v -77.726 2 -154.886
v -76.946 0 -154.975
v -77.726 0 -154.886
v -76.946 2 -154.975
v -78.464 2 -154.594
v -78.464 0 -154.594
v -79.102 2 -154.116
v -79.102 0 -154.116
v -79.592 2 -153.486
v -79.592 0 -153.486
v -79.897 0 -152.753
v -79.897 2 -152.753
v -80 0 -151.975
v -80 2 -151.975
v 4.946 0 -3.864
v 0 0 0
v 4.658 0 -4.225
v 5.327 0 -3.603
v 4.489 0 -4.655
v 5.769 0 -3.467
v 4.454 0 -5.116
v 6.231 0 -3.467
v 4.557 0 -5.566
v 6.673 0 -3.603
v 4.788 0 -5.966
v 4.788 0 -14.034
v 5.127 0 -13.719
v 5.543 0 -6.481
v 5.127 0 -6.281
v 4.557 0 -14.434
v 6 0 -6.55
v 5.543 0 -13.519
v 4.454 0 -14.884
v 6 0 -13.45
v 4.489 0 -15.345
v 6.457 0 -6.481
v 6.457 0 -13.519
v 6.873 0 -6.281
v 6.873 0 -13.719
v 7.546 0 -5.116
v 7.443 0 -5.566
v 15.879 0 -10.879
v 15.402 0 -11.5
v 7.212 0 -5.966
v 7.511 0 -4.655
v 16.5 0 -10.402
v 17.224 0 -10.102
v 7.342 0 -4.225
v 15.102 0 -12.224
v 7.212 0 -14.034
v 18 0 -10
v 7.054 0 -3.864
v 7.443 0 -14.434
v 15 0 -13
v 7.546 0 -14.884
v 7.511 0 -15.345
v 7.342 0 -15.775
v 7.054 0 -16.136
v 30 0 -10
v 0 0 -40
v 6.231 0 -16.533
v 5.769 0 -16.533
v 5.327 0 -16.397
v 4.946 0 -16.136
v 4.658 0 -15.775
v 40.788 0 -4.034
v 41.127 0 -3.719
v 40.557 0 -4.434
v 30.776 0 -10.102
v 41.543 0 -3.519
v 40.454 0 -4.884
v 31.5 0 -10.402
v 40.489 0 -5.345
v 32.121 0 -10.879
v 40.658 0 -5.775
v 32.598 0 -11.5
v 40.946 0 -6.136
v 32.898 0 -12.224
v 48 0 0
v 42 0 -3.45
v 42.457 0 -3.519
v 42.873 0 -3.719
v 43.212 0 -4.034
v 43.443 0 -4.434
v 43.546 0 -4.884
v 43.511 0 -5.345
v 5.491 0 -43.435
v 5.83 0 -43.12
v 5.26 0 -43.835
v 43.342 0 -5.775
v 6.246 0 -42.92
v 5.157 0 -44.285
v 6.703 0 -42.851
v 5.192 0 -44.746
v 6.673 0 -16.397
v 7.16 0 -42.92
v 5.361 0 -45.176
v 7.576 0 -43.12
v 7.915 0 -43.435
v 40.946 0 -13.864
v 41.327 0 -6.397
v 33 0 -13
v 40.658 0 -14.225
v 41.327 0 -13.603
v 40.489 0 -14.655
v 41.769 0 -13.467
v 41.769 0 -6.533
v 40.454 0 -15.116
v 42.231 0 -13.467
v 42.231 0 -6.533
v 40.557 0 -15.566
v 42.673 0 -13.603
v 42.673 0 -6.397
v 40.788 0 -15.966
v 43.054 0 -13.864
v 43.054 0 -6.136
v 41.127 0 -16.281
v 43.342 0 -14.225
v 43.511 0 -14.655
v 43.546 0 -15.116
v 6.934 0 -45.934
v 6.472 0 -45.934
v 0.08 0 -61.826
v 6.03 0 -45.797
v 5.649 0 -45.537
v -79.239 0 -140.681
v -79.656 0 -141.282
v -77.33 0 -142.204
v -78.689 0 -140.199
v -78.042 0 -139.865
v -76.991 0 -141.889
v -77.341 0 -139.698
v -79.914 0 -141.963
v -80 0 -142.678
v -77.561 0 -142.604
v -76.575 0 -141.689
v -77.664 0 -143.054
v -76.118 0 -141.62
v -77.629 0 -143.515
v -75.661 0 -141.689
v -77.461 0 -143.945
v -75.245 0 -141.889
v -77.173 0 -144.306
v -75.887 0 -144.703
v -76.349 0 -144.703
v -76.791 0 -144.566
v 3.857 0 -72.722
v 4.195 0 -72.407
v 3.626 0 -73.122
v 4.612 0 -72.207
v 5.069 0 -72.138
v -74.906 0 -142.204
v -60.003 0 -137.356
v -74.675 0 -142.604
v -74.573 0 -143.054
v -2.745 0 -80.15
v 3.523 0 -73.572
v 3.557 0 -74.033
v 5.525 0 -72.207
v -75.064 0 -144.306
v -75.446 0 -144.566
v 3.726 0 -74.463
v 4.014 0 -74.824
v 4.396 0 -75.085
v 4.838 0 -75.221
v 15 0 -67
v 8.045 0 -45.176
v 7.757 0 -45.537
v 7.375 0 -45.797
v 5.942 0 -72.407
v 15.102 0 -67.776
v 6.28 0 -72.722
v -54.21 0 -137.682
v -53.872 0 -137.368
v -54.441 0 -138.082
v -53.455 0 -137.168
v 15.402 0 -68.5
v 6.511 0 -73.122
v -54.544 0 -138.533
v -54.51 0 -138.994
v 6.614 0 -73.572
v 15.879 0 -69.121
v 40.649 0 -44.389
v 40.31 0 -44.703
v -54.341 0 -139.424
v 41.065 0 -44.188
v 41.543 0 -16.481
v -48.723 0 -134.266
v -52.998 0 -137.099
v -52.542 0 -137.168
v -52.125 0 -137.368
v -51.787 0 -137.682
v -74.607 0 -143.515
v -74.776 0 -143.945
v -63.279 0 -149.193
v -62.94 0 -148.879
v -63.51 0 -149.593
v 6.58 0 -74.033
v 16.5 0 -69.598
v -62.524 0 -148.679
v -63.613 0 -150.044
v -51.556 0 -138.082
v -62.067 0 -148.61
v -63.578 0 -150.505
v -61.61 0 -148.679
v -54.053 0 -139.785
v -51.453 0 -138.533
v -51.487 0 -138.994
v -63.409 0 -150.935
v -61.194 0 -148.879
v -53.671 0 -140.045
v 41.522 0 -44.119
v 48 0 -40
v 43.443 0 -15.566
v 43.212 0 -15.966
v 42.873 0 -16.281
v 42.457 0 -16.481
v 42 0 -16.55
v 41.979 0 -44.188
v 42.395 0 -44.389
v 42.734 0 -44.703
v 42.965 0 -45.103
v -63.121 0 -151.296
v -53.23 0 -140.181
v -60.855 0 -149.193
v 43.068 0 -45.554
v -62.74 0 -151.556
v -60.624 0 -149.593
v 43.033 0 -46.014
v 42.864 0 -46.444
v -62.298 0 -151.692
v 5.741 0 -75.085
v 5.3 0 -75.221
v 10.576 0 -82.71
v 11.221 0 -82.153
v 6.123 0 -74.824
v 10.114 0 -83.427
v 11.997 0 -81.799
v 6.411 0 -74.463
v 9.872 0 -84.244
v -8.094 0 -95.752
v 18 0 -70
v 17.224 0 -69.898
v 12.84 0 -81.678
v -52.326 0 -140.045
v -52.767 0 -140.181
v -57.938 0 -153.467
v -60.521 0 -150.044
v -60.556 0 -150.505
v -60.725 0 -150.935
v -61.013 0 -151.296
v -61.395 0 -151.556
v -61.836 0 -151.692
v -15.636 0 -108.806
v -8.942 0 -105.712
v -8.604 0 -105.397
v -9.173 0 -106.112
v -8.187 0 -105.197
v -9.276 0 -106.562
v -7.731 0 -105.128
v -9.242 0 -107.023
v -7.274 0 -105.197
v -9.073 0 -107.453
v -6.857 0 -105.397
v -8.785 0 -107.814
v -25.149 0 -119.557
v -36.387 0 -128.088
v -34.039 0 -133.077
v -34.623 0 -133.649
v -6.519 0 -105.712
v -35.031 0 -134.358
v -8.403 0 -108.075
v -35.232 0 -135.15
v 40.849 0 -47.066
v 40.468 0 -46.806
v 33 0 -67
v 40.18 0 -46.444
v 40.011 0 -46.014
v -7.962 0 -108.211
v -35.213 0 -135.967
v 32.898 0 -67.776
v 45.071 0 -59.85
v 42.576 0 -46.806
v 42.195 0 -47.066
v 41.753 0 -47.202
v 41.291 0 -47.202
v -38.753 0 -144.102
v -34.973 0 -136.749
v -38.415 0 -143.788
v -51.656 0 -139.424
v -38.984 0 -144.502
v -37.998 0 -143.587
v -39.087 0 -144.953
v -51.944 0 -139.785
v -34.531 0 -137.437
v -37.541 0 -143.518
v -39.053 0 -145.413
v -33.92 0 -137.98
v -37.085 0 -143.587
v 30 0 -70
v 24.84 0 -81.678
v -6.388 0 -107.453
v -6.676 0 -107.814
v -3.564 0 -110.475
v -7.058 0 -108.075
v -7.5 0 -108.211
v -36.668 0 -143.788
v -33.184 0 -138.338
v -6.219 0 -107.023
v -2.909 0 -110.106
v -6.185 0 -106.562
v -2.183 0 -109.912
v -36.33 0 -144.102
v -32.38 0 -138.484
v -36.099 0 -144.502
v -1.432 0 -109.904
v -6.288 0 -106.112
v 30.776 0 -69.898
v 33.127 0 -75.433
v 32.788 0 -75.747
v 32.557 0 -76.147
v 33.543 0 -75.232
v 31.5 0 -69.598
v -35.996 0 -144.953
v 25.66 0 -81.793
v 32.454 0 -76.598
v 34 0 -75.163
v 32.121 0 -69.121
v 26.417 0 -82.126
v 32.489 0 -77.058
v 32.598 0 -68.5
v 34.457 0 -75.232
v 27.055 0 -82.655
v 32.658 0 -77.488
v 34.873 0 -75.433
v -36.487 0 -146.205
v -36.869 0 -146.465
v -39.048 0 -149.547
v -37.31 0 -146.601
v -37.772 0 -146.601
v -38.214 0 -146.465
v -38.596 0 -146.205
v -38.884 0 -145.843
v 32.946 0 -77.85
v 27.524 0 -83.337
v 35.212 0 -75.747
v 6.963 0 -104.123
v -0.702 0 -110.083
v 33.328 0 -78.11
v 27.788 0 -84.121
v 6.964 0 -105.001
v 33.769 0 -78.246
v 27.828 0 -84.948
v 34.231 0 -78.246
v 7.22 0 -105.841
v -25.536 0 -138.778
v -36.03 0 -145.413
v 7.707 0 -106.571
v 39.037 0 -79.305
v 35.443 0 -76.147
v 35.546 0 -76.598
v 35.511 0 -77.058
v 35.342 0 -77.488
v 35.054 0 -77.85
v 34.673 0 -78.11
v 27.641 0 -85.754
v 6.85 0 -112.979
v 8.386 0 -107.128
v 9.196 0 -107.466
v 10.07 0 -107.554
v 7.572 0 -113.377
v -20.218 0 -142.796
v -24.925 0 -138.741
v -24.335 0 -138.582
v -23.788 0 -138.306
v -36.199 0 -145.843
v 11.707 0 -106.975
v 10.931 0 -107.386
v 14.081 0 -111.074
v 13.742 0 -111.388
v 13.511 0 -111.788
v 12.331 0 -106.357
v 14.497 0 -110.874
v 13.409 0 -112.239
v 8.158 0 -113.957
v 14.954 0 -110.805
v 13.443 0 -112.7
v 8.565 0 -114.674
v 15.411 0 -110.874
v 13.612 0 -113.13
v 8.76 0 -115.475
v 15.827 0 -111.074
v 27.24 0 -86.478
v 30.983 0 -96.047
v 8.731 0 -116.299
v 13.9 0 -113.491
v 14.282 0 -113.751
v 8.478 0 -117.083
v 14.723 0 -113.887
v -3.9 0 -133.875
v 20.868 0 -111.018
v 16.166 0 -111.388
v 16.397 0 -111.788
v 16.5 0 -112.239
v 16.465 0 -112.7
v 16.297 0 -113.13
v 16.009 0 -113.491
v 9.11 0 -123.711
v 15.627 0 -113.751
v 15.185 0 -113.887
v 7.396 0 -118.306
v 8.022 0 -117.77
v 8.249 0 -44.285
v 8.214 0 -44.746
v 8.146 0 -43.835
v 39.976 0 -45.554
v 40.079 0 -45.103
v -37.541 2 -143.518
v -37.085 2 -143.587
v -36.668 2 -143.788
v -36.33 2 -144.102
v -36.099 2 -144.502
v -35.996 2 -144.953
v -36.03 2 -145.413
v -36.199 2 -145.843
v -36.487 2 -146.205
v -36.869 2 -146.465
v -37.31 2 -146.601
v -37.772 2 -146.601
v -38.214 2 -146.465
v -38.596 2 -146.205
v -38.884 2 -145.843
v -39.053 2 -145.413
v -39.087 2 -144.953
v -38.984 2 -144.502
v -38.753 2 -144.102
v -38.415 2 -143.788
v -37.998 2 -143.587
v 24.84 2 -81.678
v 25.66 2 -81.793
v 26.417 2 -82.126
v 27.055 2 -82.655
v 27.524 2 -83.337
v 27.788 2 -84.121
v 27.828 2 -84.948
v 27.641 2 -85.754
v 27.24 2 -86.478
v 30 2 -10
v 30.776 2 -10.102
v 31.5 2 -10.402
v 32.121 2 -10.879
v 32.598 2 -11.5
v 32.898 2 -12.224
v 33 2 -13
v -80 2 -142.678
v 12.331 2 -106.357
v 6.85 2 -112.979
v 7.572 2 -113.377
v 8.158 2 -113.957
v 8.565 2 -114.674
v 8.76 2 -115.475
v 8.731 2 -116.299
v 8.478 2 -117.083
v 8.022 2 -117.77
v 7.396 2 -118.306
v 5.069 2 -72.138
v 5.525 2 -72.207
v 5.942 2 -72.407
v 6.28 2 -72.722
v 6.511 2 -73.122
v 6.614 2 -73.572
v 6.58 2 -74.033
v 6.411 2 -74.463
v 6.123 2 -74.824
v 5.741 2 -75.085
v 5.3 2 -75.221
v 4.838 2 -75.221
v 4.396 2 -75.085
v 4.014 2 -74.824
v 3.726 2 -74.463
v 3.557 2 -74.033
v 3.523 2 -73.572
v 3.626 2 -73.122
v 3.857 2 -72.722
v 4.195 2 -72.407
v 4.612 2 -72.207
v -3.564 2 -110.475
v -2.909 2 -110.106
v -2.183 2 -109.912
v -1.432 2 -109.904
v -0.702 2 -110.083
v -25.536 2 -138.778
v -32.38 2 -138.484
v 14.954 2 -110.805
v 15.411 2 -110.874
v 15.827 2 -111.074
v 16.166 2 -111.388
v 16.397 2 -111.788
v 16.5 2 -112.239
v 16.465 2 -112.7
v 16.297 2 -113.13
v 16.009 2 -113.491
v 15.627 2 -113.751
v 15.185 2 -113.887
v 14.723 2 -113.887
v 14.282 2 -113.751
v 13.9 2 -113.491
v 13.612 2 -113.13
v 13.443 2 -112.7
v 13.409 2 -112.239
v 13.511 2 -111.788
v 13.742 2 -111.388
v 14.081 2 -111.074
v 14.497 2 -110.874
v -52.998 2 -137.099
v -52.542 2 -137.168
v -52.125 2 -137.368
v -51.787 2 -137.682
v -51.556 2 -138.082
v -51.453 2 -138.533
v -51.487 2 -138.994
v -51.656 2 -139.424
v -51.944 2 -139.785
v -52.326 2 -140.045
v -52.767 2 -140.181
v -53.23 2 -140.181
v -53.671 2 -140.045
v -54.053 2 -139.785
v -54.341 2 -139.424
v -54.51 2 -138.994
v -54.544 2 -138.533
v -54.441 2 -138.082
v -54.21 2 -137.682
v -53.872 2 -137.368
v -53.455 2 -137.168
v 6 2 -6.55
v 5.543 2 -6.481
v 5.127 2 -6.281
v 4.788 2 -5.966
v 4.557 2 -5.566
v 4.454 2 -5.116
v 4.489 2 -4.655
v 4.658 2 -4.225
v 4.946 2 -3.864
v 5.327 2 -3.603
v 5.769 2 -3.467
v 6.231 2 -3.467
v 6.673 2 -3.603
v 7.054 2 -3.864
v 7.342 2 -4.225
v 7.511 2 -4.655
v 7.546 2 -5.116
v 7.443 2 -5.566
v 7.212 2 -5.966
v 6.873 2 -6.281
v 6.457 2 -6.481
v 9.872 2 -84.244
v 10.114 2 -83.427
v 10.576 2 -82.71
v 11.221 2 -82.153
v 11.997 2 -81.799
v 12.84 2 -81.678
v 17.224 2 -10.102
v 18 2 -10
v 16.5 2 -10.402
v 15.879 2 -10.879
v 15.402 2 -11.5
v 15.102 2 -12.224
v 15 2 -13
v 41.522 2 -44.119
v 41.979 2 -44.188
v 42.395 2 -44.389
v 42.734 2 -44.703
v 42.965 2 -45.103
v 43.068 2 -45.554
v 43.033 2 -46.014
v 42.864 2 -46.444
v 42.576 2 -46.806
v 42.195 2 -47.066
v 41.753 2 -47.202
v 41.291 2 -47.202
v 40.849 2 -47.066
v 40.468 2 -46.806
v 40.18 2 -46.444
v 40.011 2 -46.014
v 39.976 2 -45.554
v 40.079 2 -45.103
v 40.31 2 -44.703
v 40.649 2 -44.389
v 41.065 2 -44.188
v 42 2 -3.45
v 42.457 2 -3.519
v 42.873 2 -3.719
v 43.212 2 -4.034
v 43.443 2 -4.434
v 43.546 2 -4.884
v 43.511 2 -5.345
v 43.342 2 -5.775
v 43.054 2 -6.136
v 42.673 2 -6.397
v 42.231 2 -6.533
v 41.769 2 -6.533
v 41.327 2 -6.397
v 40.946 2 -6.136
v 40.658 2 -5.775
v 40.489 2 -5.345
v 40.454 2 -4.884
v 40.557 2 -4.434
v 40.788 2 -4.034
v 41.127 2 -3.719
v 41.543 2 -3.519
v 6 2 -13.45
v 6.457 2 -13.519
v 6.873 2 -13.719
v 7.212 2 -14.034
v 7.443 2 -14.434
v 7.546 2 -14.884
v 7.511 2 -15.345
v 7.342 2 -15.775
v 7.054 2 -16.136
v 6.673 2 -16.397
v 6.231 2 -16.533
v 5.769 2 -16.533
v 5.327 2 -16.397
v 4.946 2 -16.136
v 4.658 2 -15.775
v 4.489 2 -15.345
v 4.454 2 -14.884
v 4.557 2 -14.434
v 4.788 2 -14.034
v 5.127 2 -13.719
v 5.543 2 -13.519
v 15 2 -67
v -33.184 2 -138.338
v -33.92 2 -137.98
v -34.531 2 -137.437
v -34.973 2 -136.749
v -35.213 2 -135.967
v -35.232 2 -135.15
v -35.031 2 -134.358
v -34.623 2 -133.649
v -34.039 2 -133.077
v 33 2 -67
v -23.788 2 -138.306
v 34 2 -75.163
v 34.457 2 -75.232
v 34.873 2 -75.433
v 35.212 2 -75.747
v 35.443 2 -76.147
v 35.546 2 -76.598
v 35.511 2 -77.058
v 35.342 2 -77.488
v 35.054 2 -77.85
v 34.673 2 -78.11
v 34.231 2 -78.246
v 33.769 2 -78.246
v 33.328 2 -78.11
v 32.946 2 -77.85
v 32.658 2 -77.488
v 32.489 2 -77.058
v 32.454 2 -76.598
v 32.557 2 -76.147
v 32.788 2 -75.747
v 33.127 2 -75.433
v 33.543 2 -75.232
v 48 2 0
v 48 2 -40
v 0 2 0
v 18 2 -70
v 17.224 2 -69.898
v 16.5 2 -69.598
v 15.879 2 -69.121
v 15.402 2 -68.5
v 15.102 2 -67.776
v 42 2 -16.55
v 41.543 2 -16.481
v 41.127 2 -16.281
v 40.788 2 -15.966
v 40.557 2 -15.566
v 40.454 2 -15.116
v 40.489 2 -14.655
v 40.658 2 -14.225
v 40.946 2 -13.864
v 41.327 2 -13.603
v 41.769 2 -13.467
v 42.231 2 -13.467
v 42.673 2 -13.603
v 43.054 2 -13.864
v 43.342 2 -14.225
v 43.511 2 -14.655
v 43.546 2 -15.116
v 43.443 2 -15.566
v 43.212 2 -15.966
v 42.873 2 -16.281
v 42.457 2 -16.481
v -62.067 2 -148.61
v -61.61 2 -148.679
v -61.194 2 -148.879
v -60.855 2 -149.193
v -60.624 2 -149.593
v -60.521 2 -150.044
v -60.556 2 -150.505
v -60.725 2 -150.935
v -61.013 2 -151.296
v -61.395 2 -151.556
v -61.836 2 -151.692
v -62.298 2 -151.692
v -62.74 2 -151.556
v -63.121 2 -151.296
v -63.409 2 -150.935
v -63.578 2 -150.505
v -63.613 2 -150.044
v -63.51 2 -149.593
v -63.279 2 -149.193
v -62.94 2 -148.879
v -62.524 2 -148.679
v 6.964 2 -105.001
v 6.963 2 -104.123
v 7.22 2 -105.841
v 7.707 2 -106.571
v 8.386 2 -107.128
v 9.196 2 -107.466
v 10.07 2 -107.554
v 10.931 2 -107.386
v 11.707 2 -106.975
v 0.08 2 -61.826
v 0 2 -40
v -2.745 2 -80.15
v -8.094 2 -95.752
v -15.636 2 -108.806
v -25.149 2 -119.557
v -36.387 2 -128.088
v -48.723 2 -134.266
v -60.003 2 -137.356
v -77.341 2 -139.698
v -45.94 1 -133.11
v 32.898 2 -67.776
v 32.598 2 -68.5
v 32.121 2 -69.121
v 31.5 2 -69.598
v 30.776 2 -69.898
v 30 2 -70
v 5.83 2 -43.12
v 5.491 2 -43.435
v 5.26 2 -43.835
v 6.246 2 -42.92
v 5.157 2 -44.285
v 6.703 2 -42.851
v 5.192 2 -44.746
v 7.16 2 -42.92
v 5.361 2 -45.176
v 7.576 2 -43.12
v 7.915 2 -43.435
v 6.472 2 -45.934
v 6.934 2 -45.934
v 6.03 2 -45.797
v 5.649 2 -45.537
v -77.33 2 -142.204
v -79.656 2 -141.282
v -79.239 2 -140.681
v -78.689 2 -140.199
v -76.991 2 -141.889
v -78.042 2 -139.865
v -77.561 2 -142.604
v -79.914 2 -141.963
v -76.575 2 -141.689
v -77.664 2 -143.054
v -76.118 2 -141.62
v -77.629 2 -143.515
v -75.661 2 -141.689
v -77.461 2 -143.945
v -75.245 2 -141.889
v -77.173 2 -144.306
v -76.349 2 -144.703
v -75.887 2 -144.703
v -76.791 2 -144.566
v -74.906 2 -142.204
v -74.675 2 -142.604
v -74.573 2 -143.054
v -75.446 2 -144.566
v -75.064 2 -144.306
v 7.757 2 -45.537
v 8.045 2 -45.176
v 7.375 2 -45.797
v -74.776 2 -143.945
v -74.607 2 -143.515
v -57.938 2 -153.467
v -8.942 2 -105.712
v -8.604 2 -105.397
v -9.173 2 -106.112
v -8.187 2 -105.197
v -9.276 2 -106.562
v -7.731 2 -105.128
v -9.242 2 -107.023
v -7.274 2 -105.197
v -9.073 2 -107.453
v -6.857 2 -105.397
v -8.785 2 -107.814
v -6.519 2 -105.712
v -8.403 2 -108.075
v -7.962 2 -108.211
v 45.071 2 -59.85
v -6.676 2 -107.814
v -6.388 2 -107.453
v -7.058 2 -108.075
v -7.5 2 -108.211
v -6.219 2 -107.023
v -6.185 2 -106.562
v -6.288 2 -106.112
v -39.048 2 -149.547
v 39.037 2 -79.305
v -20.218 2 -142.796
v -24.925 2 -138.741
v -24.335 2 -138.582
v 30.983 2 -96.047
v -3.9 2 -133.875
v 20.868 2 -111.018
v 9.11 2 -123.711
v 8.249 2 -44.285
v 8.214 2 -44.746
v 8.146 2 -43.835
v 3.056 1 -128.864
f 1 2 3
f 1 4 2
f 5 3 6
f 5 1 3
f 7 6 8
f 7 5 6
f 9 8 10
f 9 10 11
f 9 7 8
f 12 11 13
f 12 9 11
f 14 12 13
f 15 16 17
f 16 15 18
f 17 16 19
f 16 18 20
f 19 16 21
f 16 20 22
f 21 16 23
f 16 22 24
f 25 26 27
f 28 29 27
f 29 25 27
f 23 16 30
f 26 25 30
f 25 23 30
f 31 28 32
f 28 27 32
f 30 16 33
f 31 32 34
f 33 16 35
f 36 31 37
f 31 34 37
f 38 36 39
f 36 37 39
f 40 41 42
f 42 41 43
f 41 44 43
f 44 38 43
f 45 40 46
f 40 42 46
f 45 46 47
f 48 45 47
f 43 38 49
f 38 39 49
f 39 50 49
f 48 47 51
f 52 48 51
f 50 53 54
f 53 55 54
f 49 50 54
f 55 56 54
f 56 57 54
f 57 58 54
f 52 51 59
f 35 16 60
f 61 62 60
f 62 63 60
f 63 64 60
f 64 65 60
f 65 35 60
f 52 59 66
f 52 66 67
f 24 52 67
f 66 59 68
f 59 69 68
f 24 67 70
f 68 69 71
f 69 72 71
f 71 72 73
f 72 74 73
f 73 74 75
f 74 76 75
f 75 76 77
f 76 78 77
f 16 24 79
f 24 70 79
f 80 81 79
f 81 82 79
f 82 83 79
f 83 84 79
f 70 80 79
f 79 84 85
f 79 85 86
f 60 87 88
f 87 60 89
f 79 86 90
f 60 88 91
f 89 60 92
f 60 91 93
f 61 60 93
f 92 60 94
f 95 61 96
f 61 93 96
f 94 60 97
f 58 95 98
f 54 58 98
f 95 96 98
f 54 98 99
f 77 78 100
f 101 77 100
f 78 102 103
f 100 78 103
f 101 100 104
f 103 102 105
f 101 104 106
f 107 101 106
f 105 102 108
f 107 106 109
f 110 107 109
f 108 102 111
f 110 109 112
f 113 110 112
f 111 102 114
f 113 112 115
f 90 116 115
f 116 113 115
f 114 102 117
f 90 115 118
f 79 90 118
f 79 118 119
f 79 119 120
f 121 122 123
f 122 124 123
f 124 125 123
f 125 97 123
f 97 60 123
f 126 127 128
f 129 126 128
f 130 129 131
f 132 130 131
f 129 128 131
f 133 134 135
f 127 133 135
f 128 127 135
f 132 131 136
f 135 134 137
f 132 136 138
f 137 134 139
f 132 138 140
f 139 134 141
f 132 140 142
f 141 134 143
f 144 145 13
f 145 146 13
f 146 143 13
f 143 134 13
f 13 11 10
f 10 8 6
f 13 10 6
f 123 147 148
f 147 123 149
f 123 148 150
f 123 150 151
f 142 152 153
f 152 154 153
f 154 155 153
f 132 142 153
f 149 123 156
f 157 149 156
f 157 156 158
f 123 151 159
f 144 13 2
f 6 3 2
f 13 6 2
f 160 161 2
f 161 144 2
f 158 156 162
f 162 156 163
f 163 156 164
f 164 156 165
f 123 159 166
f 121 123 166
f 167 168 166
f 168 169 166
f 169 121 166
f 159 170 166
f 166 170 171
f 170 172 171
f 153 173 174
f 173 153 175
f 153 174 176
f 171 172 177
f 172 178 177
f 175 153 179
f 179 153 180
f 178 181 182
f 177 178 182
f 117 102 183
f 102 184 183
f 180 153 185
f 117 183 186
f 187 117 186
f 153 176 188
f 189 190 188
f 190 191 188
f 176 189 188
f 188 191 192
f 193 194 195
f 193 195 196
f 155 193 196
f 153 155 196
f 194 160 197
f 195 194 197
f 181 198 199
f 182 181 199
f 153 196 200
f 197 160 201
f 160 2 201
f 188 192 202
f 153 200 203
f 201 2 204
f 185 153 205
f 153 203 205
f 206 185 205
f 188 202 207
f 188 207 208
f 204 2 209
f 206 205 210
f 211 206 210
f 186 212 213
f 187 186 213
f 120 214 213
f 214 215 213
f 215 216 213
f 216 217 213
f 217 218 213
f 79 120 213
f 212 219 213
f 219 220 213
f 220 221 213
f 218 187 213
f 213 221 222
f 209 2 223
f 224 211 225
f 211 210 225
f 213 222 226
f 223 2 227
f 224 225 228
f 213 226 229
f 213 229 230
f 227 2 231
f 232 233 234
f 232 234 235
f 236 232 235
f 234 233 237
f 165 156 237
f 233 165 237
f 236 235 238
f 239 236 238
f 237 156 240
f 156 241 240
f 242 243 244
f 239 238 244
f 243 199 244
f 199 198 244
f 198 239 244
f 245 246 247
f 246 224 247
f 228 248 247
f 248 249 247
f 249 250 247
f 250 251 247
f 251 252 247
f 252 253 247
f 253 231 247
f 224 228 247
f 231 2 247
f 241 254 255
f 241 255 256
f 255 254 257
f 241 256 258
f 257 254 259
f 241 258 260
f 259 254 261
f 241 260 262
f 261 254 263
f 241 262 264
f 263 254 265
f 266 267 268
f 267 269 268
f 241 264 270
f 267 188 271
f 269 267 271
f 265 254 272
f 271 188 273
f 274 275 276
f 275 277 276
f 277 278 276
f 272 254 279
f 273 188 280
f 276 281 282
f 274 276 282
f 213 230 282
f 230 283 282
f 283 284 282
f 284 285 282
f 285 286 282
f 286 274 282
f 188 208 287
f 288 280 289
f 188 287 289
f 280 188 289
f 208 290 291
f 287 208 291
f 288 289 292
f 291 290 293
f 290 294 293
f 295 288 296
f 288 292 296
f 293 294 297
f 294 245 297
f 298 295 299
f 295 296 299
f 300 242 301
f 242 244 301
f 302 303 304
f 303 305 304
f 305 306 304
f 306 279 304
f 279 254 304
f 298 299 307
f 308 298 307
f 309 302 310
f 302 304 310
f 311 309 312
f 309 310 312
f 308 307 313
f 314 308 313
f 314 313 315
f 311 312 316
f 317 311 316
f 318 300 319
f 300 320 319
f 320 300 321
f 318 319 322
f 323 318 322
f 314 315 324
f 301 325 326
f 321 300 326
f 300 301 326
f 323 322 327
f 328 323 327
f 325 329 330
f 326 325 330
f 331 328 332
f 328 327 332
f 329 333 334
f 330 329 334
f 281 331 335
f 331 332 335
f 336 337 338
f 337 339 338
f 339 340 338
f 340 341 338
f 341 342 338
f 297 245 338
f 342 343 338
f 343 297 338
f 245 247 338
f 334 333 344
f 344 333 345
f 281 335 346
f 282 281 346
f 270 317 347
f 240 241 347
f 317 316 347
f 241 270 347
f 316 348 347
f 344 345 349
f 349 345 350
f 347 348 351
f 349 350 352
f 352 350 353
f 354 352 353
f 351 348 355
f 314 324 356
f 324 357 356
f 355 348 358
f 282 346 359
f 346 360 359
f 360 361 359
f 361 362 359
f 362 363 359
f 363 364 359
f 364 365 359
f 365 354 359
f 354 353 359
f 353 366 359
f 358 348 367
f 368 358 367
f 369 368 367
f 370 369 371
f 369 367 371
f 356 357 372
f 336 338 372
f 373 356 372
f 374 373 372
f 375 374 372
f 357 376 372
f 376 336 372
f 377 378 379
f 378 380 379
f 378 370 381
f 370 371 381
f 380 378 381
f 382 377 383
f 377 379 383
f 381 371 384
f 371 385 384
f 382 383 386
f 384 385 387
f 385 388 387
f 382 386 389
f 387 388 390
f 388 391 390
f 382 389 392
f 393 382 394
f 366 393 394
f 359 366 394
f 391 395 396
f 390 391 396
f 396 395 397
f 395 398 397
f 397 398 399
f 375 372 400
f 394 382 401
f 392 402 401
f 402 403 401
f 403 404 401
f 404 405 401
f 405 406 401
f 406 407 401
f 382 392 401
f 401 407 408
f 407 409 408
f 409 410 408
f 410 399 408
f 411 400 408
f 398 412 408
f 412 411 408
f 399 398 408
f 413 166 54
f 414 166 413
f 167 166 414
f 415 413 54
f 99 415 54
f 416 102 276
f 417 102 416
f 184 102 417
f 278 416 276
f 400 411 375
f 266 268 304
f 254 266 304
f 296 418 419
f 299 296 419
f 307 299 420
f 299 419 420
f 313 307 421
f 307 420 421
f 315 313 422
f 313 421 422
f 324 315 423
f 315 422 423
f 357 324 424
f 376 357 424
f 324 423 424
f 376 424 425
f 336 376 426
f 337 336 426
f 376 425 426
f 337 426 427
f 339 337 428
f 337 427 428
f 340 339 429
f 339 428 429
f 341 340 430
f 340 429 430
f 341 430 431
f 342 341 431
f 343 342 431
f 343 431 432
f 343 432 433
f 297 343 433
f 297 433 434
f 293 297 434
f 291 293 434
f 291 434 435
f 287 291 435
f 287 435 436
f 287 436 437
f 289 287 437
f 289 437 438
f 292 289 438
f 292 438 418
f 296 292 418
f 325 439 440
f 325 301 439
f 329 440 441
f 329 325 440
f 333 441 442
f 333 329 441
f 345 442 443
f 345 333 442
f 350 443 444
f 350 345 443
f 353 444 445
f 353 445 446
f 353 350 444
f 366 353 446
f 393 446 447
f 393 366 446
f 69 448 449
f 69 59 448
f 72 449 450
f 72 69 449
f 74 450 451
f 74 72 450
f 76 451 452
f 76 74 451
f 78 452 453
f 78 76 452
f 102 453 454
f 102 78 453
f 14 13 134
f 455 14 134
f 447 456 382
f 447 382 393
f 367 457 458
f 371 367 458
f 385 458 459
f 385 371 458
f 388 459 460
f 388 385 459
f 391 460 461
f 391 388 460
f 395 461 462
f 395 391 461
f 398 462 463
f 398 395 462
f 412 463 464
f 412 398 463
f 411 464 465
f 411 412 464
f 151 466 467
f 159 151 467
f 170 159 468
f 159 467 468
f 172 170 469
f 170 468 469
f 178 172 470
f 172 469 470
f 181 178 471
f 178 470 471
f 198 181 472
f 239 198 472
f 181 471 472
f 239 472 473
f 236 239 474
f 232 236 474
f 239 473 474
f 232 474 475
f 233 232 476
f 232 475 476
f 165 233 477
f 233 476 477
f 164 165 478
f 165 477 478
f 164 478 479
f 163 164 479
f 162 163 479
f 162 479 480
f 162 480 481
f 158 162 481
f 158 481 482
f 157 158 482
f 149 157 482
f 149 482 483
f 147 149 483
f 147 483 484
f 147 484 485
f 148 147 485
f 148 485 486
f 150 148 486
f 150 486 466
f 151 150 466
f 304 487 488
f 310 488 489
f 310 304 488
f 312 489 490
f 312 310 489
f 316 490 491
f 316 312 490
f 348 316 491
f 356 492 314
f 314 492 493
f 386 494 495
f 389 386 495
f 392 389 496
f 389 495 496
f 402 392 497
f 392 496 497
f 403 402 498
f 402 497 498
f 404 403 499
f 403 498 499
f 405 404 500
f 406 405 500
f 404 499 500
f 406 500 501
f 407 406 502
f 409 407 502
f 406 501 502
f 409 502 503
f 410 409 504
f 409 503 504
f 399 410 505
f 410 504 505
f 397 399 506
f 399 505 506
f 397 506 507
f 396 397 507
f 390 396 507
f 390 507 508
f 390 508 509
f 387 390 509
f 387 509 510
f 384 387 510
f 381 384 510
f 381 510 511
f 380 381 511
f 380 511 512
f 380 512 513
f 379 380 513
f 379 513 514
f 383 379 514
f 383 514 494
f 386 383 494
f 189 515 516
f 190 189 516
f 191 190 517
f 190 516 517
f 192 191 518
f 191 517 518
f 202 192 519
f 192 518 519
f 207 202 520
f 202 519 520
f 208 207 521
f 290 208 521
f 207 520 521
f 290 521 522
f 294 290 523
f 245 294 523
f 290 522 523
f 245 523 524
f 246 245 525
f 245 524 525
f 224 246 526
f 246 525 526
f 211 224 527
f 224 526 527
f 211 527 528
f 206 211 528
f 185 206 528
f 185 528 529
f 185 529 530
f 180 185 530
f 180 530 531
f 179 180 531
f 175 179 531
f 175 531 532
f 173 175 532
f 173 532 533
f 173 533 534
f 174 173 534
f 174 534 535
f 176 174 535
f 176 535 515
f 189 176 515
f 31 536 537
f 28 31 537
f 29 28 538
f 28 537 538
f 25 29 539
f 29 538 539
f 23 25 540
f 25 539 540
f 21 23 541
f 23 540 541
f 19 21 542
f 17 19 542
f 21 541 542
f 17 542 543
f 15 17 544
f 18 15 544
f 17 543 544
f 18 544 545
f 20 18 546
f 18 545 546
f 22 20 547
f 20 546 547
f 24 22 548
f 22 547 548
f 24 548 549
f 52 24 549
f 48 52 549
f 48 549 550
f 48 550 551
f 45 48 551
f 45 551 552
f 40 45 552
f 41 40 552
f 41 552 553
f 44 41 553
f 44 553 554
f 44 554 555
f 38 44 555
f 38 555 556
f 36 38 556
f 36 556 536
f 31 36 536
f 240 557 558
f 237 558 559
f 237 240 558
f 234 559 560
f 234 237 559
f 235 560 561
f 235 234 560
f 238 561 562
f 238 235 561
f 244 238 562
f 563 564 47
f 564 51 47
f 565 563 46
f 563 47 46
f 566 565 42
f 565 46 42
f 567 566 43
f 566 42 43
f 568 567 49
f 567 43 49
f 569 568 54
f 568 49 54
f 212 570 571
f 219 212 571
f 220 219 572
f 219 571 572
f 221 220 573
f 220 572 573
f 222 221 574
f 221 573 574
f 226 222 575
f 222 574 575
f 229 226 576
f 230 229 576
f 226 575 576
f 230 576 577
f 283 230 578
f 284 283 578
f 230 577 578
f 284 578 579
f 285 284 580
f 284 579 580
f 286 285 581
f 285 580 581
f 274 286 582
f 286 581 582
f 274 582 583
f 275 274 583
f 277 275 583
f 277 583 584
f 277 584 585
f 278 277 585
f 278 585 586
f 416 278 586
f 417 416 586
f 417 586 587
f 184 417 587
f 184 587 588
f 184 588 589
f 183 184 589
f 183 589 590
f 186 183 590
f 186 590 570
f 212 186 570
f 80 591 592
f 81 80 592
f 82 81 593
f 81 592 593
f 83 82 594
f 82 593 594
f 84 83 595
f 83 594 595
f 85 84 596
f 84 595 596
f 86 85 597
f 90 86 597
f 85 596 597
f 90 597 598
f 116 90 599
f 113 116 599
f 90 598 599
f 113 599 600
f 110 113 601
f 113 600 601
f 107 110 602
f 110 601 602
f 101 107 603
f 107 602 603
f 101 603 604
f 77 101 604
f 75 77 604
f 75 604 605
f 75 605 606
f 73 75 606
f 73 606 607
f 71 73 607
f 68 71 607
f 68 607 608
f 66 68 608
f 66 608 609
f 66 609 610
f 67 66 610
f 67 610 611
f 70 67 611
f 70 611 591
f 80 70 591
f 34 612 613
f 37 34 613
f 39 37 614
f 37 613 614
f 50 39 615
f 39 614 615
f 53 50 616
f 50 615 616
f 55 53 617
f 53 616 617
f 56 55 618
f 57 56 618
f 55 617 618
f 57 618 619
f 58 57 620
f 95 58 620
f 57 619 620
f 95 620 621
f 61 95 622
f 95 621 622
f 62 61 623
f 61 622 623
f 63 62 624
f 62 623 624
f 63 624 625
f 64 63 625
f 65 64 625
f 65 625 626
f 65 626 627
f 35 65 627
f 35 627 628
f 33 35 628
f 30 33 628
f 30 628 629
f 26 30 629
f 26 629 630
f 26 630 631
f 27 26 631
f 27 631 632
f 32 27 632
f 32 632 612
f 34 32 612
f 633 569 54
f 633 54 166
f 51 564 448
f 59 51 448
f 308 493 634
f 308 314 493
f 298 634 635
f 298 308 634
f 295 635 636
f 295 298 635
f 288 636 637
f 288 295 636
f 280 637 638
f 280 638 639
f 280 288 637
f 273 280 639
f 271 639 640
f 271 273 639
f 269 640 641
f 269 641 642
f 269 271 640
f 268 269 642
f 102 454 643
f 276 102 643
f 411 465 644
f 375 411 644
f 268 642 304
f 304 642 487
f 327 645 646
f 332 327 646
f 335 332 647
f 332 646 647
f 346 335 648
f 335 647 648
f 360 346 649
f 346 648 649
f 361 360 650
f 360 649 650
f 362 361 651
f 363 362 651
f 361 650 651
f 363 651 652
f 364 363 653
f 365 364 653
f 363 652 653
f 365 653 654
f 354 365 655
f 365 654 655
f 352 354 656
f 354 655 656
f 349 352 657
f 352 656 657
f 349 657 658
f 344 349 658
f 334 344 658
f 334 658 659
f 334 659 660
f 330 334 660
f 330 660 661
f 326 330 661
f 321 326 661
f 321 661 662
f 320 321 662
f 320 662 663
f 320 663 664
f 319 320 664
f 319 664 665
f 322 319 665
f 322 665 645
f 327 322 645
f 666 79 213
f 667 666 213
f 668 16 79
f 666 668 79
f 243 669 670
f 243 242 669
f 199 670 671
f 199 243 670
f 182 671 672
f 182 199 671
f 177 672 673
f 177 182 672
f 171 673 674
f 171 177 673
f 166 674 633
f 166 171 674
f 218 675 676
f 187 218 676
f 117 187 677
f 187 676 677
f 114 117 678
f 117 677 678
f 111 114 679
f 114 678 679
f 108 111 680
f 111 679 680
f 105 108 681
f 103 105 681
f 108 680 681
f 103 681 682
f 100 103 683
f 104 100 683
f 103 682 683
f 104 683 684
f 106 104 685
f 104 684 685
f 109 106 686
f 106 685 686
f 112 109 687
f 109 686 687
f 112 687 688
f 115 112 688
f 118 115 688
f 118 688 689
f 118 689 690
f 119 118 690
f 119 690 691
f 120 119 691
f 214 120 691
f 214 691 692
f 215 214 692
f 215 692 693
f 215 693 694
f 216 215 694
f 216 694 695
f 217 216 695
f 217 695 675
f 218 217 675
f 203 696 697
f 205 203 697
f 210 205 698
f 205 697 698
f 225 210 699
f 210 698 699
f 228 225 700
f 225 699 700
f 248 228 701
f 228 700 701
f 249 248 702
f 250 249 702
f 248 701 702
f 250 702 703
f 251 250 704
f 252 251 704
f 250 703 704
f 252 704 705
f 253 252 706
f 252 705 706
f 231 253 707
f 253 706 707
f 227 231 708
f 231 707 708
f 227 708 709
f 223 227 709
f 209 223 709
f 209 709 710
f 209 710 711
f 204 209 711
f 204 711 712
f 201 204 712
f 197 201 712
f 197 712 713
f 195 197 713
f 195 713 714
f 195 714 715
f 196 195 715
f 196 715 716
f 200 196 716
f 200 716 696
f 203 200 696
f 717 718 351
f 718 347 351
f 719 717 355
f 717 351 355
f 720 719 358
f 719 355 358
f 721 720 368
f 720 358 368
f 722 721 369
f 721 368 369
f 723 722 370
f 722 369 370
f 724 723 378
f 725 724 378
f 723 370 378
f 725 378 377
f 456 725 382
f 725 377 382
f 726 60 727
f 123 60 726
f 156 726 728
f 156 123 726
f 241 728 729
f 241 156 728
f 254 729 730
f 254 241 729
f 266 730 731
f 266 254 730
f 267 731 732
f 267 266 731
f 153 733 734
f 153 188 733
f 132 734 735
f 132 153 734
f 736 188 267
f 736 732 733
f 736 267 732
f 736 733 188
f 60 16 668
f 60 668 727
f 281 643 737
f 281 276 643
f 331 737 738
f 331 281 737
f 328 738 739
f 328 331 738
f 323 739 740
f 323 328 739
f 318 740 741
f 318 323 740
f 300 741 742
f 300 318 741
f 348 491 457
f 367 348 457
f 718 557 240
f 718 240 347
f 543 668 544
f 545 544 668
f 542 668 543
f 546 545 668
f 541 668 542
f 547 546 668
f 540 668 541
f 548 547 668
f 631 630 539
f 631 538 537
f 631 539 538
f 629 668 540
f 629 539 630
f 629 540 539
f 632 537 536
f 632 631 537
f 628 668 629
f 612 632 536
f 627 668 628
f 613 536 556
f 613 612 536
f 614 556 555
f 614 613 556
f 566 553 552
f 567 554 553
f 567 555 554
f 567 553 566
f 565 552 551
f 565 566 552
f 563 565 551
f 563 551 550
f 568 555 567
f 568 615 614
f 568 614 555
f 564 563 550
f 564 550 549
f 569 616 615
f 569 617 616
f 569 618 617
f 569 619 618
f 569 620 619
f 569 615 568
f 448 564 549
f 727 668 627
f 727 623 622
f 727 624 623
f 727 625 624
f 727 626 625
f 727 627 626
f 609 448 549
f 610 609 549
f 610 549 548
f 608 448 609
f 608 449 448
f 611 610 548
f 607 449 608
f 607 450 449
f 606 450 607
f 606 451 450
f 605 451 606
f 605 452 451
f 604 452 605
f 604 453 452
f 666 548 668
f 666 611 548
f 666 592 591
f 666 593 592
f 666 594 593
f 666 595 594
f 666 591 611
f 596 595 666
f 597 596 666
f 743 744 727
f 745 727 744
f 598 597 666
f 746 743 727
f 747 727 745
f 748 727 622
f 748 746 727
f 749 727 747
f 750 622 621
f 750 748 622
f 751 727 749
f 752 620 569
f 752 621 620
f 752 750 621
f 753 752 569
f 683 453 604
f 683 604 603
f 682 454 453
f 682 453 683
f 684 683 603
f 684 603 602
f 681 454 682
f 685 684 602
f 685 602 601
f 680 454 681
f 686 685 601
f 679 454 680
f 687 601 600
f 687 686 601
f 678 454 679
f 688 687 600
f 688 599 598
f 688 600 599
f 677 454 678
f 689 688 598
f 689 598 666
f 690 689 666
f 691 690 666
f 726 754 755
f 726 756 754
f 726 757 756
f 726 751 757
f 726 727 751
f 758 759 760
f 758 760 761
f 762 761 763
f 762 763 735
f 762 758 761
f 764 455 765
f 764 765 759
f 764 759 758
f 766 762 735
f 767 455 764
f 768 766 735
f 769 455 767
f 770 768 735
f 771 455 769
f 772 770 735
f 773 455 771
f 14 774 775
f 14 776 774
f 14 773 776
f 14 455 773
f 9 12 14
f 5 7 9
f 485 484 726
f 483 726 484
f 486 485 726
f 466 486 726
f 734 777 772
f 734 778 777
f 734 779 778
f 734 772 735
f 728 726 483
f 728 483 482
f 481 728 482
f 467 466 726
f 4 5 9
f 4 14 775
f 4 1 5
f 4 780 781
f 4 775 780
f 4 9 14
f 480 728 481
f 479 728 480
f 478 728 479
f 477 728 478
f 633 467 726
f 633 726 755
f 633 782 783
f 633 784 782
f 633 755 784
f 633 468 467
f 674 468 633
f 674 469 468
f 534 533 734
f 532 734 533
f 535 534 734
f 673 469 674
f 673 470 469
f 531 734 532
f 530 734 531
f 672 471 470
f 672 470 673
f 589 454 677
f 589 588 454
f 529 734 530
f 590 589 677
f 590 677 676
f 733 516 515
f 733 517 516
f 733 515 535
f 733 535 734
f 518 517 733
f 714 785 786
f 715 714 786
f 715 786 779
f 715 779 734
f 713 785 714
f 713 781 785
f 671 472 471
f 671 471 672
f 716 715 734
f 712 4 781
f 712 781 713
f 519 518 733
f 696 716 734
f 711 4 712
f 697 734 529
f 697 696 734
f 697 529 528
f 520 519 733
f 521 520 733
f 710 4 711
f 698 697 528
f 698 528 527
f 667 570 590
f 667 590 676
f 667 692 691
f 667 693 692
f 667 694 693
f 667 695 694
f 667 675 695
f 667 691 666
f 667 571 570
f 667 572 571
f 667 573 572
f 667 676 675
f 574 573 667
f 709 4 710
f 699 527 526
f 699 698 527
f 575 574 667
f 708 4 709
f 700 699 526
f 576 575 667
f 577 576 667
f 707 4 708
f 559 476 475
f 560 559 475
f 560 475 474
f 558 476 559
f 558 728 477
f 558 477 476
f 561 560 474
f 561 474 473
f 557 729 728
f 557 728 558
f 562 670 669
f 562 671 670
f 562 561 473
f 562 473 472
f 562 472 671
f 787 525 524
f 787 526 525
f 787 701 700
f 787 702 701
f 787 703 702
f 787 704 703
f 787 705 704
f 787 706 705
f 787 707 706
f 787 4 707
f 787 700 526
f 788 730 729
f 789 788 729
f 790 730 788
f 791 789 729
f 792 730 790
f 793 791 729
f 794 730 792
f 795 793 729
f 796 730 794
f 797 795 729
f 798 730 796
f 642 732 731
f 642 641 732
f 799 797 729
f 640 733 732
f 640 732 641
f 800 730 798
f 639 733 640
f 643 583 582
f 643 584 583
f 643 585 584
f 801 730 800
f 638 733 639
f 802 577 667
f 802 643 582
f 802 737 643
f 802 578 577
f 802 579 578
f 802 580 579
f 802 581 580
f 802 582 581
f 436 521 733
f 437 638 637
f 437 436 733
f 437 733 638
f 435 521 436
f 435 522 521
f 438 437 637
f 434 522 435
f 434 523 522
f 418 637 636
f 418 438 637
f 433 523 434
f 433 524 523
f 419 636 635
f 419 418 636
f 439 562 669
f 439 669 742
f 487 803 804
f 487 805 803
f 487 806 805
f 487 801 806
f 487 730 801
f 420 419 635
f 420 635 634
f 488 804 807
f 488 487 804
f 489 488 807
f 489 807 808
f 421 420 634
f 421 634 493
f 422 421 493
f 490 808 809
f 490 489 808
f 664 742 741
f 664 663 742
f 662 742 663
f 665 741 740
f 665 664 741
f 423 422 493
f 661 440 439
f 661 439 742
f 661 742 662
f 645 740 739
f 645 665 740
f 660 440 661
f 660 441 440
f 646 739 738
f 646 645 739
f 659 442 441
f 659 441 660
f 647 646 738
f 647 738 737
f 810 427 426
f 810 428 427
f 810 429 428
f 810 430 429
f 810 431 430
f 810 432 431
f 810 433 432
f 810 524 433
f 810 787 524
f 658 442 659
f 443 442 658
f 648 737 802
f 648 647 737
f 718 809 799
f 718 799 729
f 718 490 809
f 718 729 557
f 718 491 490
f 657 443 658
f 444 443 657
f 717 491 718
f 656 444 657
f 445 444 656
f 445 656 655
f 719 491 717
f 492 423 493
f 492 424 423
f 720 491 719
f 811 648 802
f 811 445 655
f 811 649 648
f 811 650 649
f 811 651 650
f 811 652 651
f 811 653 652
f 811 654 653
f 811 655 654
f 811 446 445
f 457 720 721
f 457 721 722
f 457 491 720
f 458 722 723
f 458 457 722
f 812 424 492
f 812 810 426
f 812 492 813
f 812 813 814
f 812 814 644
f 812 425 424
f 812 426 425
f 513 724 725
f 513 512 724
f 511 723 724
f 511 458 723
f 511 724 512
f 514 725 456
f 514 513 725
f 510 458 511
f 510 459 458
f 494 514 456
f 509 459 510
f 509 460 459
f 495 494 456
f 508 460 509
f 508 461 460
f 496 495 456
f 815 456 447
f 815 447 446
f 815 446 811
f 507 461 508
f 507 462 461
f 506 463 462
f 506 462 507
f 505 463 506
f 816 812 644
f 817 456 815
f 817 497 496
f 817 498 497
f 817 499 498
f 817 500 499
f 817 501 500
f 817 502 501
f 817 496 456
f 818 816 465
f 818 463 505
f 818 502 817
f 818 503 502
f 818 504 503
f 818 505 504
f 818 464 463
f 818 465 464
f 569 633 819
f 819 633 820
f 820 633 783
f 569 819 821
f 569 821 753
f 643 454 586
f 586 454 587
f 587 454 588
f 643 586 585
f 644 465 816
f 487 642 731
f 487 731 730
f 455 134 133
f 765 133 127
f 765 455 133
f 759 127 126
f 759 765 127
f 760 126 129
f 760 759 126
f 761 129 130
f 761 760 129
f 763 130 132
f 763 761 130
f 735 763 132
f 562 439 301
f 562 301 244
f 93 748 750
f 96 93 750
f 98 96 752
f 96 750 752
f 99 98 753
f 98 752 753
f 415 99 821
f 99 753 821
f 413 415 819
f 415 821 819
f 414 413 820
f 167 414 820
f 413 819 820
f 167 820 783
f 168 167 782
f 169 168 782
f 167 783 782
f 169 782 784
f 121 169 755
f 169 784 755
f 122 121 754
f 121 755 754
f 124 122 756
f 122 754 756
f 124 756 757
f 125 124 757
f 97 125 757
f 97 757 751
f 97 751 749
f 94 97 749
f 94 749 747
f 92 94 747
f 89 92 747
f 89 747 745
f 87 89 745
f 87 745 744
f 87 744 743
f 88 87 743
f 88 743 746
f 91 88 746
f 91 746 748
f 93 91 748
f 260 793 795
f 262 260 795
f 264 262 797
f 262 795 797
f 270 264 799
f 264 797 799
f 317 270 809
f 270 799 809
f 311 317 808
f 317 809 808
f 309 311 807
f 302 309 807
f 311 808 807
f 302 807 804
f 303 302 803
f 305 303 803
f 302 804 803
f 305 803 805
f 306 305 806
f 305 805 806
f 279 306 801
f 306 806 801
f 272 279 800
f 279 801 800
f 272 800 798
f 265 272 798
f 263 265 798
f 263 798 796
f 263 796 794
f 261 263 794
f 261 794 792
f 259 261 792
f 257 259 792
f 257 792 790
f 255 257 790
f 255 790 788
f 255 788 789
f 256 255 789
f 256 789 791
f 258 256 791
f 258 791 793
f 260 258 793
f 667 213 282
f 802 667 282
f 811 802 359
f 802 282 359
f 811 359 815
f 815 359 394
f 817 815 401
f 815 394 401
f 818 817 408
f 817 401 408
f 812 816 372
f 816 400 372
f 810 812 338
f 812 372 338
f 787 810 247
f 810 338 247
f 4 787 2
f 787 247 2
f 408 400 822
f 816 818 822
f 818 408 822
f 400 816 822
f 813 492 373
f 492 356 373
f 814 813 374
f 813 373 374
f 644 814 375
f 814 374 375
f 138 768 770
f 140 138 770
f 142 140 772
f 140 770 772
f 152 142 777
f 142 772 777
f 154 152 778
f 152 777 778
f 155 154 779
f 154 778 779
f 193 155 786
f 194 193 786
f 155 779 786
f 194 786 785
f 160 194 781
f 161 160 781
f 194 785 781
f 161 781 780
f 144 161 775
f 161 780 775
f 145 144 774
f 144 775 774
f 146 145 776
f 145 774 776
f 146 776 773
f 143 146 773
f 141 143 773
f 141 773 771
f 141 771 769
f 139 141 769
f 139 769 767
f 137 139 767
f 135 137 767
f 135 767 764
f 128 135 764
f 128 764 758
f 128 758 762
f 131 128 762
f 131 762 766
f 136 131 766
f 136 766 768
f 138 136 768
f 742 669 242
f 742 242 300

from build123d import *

# Parameters (mm, degrees)
SKETCH_1_W          = 48
SKETCH_1_H          = 40
EXTRUDE_1_DEPTH     = 2
SKETCH_2_R          = 1.55
CUT_EXTRUDE_1_DEPTH = 175.439280555
SKETCH_3_W          = 18
SKETCH_3_H          = 60
CUT_EXTRUDE_2_DEPTH = 175.439280555
FILLET_1_R          = 3
CUT_EXTRUDE_3_DEPTH = 175.439280555
FILLET_2_R          = 3
CUT_EXTRUDE_4_DEPTH = 175.439280555
FILLET_3_R          = 3
SKETCH_6_R          = 1.55
CUT_EXTRUDE_5_DEPTH = 175.439280555
FILLET_4_R          = 3


with BuildPart() as part:
    # 草图1 → 凸台-拉伸1 (new body)
    with BuildSketch(Plane(origin=(0, 0, 0), x_dir=(1, 0, 0), z_dir=(0, 1, 0))):
        with BuildLine():
            Line((0, 40), (48, 40))
            add(Edge.make_bspline(
                [(48, 40), (45.764951139, 73.28949707), (16.036127279, 137.632117299), (-51.062317124, 155.04671395), (-80, 155)],
                knots=[0, 0, 0, 0, 0.537039459, 1, 1, 1, 1], degree=3))
            Line((-80, 155), (-80, 140))
            add(Edge.make_bspline(
                [(0, 40), (4.51482928, 101.708069088), (-40.684527931, 134.921736198), (-60.886519043, 137.838657836), (-80, 140)],
                knots=[0, 0, 0, 0, 0.623950537, 0.904720498, 0.904720498, 0.904720498, 0.904720498], degree=3))
        make_face()
        with Locations((24, 20)):
            Rectangle(SKETCH_1_W, SKETCH_1_H)
    extrude(amount=EXTRUDE_1_DEPTH)

    # 草图2 → 切除-拉伸1 (cut, through all)
    with BuildSketch(Plane(origin=(0, 2, 0), x_dir=(1, 0, 0), z_dir=(0, 1, 0))):
        with Locations(Location((6, 15, 0), (0, 0, 270))):
            Circle(SKETCH_2_R)
        with Locations(Location((42, 15, 0), (0, 0, 90))):
            Circle(SKETCH_2_R)
        with Locations(Location((42, 5, 0), (0, 0, 270))):
            Circle(SKETCH_2_R)
        with Locations(Location((6, 5, 0), (0, 0, 90))):
            Circle(SKETCH_2_R)
    extrude(amount=-CUT_EXTRUDE_1_DEPTH, mode=Mode.SUBTRACT)

    # 草图3 → 切除-拉伸2 (cut, through all)
    with BuildSketch(Plane(origin=(0, 2, 0), x_dir=(1, 0, 0), z_dir=(0, 1, 0))):
        with Locations((24, 40)):
            Rectangle(SKETCH_3_W, SKETCH_3_H)
    extrude(amount=-CUT_EXTRUDE_2_DEPTH, mode=Mode.SUBTRACT)

    # 圆角1
    fillet_1_edges = [part.edges().sort_by_distance(p)[0] for p in [
        (33, 1, -70),
        (33, 1, -10),
        (15, 1, -10),
        (15, 1, -70),
    ]]
    fillet(fillet_1_edges, radius=FILLET_1_R)

    # 草图4 → 切除-拉伸3 (cut, through all)
    with BuildSketch(Plane(origin=(0, 2, 0), x_dir=(1, 0, 0), z_dir=(0, 1, 0))):
        Polygon((5.255148973, 115.791883332), (30.840281778, 81.678372925), (10.247370008, 81.678372925), align=None)
    extrude(amount=-CUT_EXTRUDE_3_DEPTH, mode=Mode.SUBTRACT)

    # 圆角2
    fillet_2_edges = [part.edges().sort_by_distance(p)[0] for p in [
        (10.247370008, 1, -81.678372925),
        (5.255148973, 1, -115.791883332),
        (30.840281778, 1, -81.678372925),
    ]]
    fillet(fillet_2_edges, radius=FILLET_2_R)

    # 草图5 → 切除-拉伸4 (cut, through all)
    with BuildSketch(Plane(origin=(0, 2, 0), x_dir=(1, 0, 0), z_dir=(0, 1, 0))):
        Polygon((-24.587676852, 138.818288759), (-40.839221994, 138.120949417), (-2.240425067, 109.493508363), (12.388978152, 115.103279522), align=None)
    extrude(amount=-CUT_EXTRUDE_4_DEPTH, mode=Mode.SUBTRACT)

    # 圆角3
    fillet_3_edges = [part.edges().sort_by_distance(p)[0] for p in [
        (-24.587676852, 1, -138.818288759),
        (12.388978152, 1, -115.103279522),
        (-2.240425067, 1, -109.493508363),
        (-40.839221994, 1, -138.120949417),
    ]]
    fillet(fillet_3_edges, radius=FILLET_3_R)

    # 草图6 → 切除-拉伸5 (cut, through all)
    with BuildSketch(Plane(origin=(0, 2, 0), x_dir=(1, 0, 0), z_dir=(0, 1, 0))):
        with Locations(Location((-76.118296747, 143.169932104, 0), (0, 0, 270))):
            Circle(SKETCH_6_R)
        with Locations(Location((-52.99849703, 138.648726826, 0), (0, 0, 270))):
            Circle(SKETCH_6_R)
        with Locations(Location((-7.730564413, 106.678081972, 0), (0, 0, 270))):
            Circle(SKETCH_6_R)
        with Locations(Location((5.068521195, 73.688071708, 0), (0, 0, 270))):
            Circle(SKETCH_6_R)
        with Locations(Location((6.702898523, 44.400963853, 0), (0, 0, 270))):
            Circle(SKETCH_6_R)
        with Locations(Location((34.000156558, 76.713375319, 0), (0, 0, 270))):
            Circle(SKETCH_6_R)
        with Locations(Location((41.522008079, 45.669395879, 0), (0, 0, 270))):
            Circle(SKETCH_6_R)
        with Locations(Location((14.954237137, 112.354667387, 0), (0, 0, 270))):
            Circle(SKETCH_6_R)
        with Locations(Location((-37.541455494, 145.068490418, 0), (0, 0, 270))):
            Circle(SKETCH_6_R)
        with Locations(Location((-62.067047187, 150.159650611, 0), (0, 0, 270))):
            Circle(SKETCH_6_R)
    extrude(amount=-CUT_EXTRUDE_5_DEPTH, mode=Mode.SUBTRACT)

    # 圆角4
    fillet_4_edges = [part.edges().sort_by_distance(p)[0] for p in [
        (-80, 1, -140),
        (-80, 1, -155),
    ]]
    fillet(fillet_4_edges, radius=FILLET_4_R)


solid = part.part
